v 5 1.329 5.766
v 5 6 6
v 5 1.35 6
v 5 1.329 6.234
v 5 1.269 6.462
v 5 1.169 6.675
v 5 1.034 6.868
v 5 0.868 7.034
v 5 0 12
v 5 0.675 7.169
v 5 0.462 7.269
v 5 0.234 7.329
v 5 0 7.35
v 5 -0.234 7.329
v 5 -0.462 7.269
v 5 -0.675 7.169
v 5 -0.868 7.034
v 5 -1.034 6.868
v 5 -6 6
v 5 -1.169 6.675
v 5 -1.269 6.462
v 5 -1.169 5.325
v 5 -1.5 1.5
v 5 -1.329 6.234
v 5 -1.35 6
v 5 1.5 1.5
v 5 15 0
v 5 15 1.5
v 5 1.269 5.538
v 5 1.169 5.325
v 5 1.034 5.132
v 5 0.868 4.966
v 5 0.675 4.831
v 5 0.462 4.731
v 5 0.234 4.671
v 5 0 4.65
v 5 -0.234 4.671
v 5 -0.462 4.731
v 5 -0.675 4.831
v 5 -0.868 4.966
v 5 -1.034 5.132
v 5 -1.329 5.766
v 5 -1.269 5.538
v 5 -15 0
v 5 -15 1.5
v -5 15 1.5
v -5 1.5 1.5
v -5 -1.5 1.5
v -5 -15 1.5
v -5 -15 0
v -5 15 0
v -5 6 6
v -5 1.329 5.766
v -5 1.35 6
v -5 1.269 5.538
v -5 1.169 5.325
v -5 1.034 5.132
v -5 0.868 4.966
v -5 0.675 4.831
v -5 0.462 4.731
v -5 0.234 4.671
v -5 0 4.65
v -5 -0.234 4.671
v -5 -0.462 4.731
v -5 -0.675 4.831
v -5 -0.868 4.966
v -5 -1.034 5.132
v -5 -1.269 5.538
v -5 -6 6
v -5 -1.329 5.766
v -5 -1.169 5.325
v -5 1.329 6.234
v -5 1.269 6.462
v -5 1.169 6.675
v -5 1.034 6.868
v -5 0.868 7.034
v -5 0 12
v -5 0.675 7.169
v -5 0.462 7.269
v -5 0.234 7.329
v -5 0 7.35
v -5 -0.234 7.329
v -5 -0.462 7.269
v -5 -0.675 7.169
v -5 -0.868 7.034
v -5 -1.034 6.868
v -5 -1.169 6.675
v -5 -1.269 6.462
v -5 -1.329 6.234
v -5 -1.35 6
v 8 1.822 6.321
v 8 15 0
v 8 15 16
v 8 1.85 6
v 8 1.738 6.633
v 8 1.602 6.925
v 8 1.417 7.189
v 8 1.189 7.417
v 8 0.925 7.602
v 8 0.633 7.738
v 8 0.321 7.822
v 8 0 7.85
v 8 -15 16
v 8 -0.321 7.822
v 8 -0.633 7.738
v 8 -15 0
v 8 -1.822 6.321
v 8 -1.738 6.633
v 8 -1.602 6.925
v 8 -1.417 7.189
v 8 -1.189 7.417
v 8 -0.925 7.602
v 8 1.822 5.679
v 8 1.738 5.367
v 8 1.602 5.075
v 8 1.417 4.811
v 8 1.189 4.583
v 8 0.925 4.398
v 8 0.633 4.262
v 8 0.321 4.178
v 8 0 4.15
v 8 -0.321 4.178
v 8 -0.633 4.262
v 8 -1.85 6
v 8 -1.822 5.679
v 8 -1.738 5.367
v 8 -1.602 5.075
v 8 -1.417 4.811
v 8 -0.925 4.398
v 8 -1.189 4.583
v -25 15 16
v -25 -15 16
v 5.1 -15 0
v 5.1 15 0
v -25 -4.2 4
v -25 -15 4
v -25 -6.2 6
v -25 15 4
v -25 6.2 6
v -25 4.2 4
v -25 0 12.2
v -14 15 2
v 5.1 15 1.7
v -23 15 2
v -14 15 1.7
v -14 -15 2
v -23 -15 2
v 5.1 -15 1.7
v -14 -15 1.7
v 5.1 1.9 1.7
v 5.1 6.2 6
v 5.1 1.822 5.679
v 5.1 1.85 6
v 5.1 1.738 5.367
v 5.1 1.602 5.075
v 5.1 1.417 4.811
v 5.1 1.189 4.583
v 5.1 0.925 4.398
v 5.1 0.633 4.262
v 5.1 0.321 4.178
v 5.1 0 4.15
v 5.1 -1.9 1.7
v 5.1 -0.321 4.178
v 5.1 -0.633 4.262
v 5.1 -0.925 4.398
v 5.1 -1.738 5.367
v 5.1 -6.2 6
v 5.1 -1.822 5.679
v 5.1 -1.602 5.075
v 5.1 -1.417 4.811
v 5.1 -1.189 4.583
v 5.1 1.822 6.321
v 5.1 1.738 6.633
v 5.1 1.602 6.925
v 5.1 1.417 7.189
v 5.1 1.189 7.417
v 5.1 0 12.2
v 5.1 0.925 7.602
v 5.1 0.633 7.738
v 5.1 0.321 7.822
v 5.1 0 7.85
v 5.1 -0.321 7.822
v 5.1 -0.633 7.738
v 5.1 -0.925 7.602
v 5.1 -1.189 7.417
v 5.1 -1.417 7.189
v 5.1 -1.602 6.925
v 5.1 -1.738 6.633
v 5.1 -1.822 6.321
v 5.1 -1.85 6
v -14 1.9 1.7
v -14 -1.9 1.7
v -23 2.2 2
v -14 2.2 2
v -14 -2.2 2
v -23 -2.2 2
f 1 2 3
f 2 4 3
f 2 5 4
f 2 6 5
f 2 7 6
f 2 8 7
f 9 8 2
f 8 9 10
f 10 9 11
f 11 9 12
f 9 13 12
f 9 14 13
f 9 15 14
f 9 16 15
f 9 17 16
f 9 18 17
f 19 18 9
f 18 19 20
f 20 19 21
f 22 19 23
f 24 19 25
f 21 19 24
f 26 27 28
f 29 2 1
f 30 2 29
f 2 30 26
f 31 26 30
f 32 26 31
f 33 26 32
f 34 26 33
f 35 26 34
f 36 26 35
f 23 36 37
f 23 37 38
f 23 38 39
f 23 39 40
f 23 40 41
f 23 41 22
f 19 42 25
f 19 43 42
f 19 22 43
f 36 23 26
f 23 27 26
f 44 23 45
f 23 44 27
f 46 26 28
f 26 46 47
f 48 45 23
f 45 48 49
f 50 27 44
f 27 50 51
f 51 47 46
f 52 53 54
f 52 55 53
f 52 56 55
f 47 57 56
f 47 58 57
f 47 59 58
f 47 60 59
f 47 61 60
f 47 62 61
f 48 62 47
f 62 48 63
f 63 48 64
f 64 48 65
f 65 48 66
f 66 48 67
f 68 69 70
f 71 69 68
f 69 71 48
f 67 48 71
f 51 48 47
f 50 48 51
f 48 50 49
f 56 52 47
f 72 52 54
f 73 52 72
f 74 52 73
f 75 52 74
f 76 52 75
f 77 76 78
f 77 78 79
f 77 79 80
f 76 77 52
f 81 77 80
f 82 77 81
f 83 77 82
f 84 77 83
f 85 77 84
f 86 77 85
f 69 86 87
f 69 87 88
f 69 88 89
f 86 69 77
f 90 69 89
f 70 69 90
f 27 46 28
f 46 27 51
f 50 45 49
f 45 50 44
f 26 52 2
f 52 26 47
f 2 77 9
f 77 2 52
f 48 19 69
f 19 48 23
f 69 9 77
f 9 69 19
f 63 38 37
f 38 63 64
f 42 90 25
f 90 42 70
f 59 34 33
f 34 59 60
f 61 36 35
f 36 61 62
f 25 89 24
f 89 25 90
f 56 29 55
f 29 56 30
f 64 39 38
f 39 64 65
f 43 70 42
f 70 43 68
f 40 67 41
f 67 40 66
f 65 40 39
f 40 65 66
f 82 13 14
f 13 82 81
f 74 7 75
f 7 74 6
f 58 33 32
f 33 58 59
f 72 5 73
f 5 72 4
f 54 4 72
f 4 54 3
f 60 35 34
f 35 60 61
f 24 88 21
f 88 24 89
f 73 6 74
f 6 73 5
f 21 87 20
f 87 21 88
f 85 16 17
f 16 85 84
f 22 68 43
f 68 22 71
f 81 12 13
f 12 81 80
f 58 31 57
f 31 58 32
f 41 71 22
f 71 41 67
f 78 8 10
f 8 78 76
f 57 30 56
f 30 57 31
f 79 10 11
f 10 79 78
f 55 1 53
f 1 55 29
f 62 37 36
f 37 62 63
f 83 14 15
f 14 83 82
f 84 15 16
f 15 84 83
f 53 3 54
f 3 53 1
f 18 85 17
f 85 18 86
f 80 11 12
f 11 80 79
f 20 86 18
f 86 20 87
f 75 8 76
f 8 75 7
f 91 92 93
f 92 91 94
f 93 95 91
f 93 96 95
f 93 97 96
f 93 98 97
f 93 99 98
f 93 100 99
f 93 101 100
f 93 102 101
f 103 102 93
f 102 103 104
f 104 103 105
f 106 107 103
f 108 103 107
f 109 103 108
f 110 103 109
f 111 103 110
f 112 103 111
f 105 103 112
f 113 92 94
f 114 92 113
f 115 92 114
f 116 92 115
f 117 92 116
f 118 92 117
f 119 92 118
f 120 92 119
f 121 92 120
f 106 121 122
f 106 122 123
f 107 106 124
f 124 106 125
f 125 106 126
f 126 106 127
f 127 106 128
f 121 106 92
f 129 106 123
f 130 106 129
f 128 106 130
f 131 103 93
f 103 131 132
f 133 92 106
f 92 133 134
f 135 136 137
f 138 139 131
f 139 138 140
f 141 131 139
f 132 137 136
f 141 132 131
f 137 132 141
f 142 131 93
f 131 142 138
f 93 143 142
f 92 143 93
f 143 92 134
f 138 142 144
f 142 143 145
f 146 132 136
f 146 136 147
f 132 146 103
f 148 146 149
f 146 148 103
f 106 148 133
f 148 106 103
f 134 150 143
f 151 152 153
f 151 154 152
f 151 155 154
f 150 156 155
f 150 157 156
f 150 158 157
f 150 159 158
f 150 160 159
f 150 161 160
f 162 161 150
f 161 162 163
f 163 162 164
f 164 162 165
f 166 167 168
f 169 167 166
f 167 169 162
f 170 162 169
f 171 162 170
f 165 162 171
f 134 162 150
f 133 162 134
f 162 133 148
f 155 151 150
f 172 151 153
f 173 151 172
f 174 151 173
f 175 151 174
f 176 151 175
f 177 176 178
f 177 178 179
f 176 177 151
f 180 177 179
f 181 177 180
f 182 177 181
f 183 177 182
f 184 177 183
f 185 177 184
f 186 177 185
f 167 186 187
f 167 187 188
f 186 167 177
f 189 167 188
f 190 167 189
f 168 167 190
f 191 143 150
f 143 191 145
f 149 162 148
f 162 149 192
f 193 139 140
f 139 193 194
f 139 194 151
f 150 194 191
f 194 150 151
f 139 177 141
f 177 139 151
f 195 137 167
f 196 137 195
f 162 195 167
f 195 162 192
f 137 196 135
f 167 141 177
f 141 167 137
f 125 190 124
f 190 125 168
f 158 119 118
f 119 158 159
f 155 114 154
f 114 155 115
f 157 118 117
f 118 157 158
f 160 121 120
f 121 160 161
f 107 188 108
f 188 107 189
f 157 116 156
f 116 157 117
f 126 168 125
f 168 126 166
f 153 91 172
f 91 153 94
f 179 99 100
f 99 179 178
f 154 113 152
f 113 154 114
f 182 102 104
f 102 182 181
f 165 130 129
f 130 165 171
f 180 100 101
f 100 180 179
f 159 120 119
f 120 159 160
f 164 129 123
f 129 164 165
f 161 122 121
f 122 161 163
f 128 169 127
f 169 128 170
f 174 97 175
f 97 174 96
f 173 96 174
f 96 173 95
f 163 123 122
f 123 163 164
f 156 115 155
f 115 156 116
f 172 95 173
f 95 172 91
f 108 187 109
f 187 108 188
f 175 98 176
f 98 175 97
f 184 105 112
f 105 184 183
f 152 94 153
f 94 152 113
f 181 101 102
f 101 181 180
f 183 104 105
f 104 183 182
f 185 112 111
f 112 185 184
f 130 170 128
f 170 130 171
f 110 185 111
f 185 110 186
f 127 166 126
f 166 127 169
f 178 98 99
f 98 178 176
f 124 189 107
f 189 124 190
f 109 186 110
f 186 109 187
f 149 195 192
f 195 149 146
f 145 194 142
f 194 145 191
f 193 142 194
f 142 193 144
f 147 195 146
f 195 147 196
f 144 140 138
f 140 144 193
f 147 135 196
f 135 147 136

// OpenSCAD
//I've been thinking for a while how I can fit a larger borosilicate glass to my 200x200mm heatbed. I mostly print PLA so it is not critical if some parts of the print are not heated. I modified my printer to have a larger print area but I still cannot print things larger than my standard Geeetech glass.
//So, I decided it is time to upgrade the print bed and this is what I came up with...
//First problem are the screws heads that adjust the levelling of the bed...I decided to countersink the PCB of the bed so they are flush with everything else.
//The second and most important, was how to fix the glass (the original one is held in place by 4 paper clips as many others), with the possibility of easily remove it.
//As the glass is flat, without holes or screws that can catch on and it greatly exceed the PCB size, I first didn't know how to aspproach that but I got this idea and here it is...
//As PLA do not require high bed temperature this should not cause issues, but the pushing bit that touch the PCB could be made of high temperature filament, aluminum, wood, fiberglass or other materials, it is a simple part that would not take too long to be shaped even by hand from a square piece of metal.
//Silicone sealant should be more than enough for glueing the part to the glass, plus it is easily removable, but if you prefer you can use epoxy or any other glue you consider more appropriate (Please share the info if you know of specialty glues that may be more appropriate).
//The bonding part shuld be thinner or the same thickness of the PCB
//I added an example of how can be made the extra piece in a different material (Part_3)


$fn=36;
//The part that is going to be glued to the glass
Bonding_area_X_size=10;
Bonding_area_Y_size=30;
//Thinner than PCB thickness
Bonding_area_thickness=1.5;
//The part that will overlap the PCB to hold it
Locking_area=20;

Screw_holder_radius=6;
Screw_hole_radius=1.35;

//Thickness of the PCB heatbed
PCB_thickness=2;
//To make the sliding work, you may need to adjust this for your printer tolerances
Tolerance=0.2;

//Render or not    0=no   1=yes
//Bonding partt
Part_1=1;
//Slider
Part_2=1;
//Extra bit in different material
Part_3=0;

//If you want to make the part that touch the PCB in different material put this to 1
End_part_fixing_points=0;
Extra_bit_screw_hole_radius=1.35;


if(Part_1==1)
difference()
   {
   union()
      {
      translate([-Bonding_area_X_size/2,-Bonding_area_Y_size/2,0])
         rotate([0,0,0])
            cube([Bonding_area_X_size,Bonding_area_Y_size,Bonding_area_thickness]);

      translate([-Bonding_area_X_size/2,0,Screw_holder_radius])
         rotate([0,90,0])
            cylinder(r=Screw_holder_radius,h=Bonding_area_X_size,$fn=4);
      }
      translate([-Bonding_area_X_size/2-1,0,Screw_holder_radius])
         rotate([0,90,0])
            cylinder(r=Screw_hole_radius,h=Bonding_area_X_size+2);
   }

if(Part_2==1)
rotate([0,0,0])
difference()
   {
   union()
      {
      translate([-Bonding_area_X_size/2-Locking_area,-Bonding_area_Y_size/2,0])
         rotate([0,0,0])
            cube([Bonding_area_X_size+Locking_area+3,Bonding_area_Y_size,Screw_holder_radius*2+4]);
      }

      translate([-Bonding_area_X_size/2-Tolerance/2-Locking_area,-Bonding_area_Y_size/2-Tolerance/2,-Tolerance])
         rotate([0,0,0])
            cube([Bonding_area_X_size+Tolerance+Locking_area,Bonding_area_Y_size+Tolerance,Bonding_area_thickness+Tolerance*2]);

      translate([-Bonding_area_X_size/2-Locking_area-1.9,0,Screw_holder_radius])
         rotate([0,90,0])
            cylinder(r=Screw_holder_radius+Tolerance,h=Bonding_area_X_size+2+Locking_area,$fn=4);


      translate([-Bonding_area_X_size/2-1,0,Screw_holder_radius])
         rotate([0,90,0])
            cylinder(r=Screw_hole_radius+0.5,h=Bonding_area_X_size*2);

      translate([-55-Bonding_area_X_size/2-4,-25,0])
         rotate([0,0,0])
            cube([50,50,PCB_thickness]);

      translate([-Bonding_area_X_size/2-Locking_area-1,0,0])
         rotate([90,0,0])
            cylinder(r=5,h=Bonding_area_Y_size*3,$fn=4,center=true);


      if(Part_3==1)
         {
         translate([-50-Bonding_area_X_size,-25,-10])
            cube([50,50,50]);
         translate([-Bonding_area_X_size-1,Bonding_area_Y_size/3,Screw_holder_radius+Bonding_area_thickness])
            rotate([0,90,0])
               cylinder(r=Extra_bit_screw_hole_radius,h=Bonding_area_X_size*3);
         translate([-Bonding_area_X_size-1,-Bonding_area_Y_size/3,Screw_holder_radius+Bonding_area_thickness])
            rotate([0,90,0])
               cylinder(r=Extra_bit_screw_hole_radius,h=Bonding_area_X_size*3);

         }
   }


//Extra part made of heat resistant material
//This is just an example that can be made easily from other material
if(Part_3==1)
difference()
   {
   union()
      {
      translate([-25,-15,PCB_thickness])
         cube([15,9,14]);
      translate([-25,-7,12])
         cube([15,15,4]);
      translate([-25,6,PCB_thickness])
         cube([15,9,14]);

      translate([-25,-15,Bonding_area_thickness+Tolerance])
         cube([15,9,14]);
      translate([-25,6,Bonding_area_thickness+Tolerance])
         cube([15,9,14]);
      }

      translate([-Bonding_area_X_size-Locking_area,Bonding_area_Y_size/3,Screw_holder_radius+Bonding_area_thickness])
         rotate([0,90,0])
            cylinder(r=Extra_bit_screw_hole_radius+0.5,h=Bonding_area_X_size*5);

      translate([-Bonding_area_X_size-16,-Bonding_area_Y_size/3,Screw_holder_radius+Bonding_area_thickness])
         rotate([0,90,0])
            cylinder(r=Extra_bit_screw_hole_radius+0.5,h=Bonding_area_X_size*5);

      translate([-55-Bonding_area_X_size/2-4,-25,0])
         rotate([0,0,0])
            cube([50,50,PCB_thickness]);

      translate([-Bonding_area_X_size/2-Locking_area-1,0,0])
         rotate([90,0,0])
            cylinder(r=5,h=Bonding_area_Y_size*3,$fn=4,center=true);

      translate([-Bonding_area_X_size/2-Locking_area-1.9,0,Screw_holder_radius])
         rotate([0,90,0])
            cylinder(r=Screw_holder_radius+Tolerance,h=Bonding_area_X_size+2+Locking_area,$fn=4);
   }
